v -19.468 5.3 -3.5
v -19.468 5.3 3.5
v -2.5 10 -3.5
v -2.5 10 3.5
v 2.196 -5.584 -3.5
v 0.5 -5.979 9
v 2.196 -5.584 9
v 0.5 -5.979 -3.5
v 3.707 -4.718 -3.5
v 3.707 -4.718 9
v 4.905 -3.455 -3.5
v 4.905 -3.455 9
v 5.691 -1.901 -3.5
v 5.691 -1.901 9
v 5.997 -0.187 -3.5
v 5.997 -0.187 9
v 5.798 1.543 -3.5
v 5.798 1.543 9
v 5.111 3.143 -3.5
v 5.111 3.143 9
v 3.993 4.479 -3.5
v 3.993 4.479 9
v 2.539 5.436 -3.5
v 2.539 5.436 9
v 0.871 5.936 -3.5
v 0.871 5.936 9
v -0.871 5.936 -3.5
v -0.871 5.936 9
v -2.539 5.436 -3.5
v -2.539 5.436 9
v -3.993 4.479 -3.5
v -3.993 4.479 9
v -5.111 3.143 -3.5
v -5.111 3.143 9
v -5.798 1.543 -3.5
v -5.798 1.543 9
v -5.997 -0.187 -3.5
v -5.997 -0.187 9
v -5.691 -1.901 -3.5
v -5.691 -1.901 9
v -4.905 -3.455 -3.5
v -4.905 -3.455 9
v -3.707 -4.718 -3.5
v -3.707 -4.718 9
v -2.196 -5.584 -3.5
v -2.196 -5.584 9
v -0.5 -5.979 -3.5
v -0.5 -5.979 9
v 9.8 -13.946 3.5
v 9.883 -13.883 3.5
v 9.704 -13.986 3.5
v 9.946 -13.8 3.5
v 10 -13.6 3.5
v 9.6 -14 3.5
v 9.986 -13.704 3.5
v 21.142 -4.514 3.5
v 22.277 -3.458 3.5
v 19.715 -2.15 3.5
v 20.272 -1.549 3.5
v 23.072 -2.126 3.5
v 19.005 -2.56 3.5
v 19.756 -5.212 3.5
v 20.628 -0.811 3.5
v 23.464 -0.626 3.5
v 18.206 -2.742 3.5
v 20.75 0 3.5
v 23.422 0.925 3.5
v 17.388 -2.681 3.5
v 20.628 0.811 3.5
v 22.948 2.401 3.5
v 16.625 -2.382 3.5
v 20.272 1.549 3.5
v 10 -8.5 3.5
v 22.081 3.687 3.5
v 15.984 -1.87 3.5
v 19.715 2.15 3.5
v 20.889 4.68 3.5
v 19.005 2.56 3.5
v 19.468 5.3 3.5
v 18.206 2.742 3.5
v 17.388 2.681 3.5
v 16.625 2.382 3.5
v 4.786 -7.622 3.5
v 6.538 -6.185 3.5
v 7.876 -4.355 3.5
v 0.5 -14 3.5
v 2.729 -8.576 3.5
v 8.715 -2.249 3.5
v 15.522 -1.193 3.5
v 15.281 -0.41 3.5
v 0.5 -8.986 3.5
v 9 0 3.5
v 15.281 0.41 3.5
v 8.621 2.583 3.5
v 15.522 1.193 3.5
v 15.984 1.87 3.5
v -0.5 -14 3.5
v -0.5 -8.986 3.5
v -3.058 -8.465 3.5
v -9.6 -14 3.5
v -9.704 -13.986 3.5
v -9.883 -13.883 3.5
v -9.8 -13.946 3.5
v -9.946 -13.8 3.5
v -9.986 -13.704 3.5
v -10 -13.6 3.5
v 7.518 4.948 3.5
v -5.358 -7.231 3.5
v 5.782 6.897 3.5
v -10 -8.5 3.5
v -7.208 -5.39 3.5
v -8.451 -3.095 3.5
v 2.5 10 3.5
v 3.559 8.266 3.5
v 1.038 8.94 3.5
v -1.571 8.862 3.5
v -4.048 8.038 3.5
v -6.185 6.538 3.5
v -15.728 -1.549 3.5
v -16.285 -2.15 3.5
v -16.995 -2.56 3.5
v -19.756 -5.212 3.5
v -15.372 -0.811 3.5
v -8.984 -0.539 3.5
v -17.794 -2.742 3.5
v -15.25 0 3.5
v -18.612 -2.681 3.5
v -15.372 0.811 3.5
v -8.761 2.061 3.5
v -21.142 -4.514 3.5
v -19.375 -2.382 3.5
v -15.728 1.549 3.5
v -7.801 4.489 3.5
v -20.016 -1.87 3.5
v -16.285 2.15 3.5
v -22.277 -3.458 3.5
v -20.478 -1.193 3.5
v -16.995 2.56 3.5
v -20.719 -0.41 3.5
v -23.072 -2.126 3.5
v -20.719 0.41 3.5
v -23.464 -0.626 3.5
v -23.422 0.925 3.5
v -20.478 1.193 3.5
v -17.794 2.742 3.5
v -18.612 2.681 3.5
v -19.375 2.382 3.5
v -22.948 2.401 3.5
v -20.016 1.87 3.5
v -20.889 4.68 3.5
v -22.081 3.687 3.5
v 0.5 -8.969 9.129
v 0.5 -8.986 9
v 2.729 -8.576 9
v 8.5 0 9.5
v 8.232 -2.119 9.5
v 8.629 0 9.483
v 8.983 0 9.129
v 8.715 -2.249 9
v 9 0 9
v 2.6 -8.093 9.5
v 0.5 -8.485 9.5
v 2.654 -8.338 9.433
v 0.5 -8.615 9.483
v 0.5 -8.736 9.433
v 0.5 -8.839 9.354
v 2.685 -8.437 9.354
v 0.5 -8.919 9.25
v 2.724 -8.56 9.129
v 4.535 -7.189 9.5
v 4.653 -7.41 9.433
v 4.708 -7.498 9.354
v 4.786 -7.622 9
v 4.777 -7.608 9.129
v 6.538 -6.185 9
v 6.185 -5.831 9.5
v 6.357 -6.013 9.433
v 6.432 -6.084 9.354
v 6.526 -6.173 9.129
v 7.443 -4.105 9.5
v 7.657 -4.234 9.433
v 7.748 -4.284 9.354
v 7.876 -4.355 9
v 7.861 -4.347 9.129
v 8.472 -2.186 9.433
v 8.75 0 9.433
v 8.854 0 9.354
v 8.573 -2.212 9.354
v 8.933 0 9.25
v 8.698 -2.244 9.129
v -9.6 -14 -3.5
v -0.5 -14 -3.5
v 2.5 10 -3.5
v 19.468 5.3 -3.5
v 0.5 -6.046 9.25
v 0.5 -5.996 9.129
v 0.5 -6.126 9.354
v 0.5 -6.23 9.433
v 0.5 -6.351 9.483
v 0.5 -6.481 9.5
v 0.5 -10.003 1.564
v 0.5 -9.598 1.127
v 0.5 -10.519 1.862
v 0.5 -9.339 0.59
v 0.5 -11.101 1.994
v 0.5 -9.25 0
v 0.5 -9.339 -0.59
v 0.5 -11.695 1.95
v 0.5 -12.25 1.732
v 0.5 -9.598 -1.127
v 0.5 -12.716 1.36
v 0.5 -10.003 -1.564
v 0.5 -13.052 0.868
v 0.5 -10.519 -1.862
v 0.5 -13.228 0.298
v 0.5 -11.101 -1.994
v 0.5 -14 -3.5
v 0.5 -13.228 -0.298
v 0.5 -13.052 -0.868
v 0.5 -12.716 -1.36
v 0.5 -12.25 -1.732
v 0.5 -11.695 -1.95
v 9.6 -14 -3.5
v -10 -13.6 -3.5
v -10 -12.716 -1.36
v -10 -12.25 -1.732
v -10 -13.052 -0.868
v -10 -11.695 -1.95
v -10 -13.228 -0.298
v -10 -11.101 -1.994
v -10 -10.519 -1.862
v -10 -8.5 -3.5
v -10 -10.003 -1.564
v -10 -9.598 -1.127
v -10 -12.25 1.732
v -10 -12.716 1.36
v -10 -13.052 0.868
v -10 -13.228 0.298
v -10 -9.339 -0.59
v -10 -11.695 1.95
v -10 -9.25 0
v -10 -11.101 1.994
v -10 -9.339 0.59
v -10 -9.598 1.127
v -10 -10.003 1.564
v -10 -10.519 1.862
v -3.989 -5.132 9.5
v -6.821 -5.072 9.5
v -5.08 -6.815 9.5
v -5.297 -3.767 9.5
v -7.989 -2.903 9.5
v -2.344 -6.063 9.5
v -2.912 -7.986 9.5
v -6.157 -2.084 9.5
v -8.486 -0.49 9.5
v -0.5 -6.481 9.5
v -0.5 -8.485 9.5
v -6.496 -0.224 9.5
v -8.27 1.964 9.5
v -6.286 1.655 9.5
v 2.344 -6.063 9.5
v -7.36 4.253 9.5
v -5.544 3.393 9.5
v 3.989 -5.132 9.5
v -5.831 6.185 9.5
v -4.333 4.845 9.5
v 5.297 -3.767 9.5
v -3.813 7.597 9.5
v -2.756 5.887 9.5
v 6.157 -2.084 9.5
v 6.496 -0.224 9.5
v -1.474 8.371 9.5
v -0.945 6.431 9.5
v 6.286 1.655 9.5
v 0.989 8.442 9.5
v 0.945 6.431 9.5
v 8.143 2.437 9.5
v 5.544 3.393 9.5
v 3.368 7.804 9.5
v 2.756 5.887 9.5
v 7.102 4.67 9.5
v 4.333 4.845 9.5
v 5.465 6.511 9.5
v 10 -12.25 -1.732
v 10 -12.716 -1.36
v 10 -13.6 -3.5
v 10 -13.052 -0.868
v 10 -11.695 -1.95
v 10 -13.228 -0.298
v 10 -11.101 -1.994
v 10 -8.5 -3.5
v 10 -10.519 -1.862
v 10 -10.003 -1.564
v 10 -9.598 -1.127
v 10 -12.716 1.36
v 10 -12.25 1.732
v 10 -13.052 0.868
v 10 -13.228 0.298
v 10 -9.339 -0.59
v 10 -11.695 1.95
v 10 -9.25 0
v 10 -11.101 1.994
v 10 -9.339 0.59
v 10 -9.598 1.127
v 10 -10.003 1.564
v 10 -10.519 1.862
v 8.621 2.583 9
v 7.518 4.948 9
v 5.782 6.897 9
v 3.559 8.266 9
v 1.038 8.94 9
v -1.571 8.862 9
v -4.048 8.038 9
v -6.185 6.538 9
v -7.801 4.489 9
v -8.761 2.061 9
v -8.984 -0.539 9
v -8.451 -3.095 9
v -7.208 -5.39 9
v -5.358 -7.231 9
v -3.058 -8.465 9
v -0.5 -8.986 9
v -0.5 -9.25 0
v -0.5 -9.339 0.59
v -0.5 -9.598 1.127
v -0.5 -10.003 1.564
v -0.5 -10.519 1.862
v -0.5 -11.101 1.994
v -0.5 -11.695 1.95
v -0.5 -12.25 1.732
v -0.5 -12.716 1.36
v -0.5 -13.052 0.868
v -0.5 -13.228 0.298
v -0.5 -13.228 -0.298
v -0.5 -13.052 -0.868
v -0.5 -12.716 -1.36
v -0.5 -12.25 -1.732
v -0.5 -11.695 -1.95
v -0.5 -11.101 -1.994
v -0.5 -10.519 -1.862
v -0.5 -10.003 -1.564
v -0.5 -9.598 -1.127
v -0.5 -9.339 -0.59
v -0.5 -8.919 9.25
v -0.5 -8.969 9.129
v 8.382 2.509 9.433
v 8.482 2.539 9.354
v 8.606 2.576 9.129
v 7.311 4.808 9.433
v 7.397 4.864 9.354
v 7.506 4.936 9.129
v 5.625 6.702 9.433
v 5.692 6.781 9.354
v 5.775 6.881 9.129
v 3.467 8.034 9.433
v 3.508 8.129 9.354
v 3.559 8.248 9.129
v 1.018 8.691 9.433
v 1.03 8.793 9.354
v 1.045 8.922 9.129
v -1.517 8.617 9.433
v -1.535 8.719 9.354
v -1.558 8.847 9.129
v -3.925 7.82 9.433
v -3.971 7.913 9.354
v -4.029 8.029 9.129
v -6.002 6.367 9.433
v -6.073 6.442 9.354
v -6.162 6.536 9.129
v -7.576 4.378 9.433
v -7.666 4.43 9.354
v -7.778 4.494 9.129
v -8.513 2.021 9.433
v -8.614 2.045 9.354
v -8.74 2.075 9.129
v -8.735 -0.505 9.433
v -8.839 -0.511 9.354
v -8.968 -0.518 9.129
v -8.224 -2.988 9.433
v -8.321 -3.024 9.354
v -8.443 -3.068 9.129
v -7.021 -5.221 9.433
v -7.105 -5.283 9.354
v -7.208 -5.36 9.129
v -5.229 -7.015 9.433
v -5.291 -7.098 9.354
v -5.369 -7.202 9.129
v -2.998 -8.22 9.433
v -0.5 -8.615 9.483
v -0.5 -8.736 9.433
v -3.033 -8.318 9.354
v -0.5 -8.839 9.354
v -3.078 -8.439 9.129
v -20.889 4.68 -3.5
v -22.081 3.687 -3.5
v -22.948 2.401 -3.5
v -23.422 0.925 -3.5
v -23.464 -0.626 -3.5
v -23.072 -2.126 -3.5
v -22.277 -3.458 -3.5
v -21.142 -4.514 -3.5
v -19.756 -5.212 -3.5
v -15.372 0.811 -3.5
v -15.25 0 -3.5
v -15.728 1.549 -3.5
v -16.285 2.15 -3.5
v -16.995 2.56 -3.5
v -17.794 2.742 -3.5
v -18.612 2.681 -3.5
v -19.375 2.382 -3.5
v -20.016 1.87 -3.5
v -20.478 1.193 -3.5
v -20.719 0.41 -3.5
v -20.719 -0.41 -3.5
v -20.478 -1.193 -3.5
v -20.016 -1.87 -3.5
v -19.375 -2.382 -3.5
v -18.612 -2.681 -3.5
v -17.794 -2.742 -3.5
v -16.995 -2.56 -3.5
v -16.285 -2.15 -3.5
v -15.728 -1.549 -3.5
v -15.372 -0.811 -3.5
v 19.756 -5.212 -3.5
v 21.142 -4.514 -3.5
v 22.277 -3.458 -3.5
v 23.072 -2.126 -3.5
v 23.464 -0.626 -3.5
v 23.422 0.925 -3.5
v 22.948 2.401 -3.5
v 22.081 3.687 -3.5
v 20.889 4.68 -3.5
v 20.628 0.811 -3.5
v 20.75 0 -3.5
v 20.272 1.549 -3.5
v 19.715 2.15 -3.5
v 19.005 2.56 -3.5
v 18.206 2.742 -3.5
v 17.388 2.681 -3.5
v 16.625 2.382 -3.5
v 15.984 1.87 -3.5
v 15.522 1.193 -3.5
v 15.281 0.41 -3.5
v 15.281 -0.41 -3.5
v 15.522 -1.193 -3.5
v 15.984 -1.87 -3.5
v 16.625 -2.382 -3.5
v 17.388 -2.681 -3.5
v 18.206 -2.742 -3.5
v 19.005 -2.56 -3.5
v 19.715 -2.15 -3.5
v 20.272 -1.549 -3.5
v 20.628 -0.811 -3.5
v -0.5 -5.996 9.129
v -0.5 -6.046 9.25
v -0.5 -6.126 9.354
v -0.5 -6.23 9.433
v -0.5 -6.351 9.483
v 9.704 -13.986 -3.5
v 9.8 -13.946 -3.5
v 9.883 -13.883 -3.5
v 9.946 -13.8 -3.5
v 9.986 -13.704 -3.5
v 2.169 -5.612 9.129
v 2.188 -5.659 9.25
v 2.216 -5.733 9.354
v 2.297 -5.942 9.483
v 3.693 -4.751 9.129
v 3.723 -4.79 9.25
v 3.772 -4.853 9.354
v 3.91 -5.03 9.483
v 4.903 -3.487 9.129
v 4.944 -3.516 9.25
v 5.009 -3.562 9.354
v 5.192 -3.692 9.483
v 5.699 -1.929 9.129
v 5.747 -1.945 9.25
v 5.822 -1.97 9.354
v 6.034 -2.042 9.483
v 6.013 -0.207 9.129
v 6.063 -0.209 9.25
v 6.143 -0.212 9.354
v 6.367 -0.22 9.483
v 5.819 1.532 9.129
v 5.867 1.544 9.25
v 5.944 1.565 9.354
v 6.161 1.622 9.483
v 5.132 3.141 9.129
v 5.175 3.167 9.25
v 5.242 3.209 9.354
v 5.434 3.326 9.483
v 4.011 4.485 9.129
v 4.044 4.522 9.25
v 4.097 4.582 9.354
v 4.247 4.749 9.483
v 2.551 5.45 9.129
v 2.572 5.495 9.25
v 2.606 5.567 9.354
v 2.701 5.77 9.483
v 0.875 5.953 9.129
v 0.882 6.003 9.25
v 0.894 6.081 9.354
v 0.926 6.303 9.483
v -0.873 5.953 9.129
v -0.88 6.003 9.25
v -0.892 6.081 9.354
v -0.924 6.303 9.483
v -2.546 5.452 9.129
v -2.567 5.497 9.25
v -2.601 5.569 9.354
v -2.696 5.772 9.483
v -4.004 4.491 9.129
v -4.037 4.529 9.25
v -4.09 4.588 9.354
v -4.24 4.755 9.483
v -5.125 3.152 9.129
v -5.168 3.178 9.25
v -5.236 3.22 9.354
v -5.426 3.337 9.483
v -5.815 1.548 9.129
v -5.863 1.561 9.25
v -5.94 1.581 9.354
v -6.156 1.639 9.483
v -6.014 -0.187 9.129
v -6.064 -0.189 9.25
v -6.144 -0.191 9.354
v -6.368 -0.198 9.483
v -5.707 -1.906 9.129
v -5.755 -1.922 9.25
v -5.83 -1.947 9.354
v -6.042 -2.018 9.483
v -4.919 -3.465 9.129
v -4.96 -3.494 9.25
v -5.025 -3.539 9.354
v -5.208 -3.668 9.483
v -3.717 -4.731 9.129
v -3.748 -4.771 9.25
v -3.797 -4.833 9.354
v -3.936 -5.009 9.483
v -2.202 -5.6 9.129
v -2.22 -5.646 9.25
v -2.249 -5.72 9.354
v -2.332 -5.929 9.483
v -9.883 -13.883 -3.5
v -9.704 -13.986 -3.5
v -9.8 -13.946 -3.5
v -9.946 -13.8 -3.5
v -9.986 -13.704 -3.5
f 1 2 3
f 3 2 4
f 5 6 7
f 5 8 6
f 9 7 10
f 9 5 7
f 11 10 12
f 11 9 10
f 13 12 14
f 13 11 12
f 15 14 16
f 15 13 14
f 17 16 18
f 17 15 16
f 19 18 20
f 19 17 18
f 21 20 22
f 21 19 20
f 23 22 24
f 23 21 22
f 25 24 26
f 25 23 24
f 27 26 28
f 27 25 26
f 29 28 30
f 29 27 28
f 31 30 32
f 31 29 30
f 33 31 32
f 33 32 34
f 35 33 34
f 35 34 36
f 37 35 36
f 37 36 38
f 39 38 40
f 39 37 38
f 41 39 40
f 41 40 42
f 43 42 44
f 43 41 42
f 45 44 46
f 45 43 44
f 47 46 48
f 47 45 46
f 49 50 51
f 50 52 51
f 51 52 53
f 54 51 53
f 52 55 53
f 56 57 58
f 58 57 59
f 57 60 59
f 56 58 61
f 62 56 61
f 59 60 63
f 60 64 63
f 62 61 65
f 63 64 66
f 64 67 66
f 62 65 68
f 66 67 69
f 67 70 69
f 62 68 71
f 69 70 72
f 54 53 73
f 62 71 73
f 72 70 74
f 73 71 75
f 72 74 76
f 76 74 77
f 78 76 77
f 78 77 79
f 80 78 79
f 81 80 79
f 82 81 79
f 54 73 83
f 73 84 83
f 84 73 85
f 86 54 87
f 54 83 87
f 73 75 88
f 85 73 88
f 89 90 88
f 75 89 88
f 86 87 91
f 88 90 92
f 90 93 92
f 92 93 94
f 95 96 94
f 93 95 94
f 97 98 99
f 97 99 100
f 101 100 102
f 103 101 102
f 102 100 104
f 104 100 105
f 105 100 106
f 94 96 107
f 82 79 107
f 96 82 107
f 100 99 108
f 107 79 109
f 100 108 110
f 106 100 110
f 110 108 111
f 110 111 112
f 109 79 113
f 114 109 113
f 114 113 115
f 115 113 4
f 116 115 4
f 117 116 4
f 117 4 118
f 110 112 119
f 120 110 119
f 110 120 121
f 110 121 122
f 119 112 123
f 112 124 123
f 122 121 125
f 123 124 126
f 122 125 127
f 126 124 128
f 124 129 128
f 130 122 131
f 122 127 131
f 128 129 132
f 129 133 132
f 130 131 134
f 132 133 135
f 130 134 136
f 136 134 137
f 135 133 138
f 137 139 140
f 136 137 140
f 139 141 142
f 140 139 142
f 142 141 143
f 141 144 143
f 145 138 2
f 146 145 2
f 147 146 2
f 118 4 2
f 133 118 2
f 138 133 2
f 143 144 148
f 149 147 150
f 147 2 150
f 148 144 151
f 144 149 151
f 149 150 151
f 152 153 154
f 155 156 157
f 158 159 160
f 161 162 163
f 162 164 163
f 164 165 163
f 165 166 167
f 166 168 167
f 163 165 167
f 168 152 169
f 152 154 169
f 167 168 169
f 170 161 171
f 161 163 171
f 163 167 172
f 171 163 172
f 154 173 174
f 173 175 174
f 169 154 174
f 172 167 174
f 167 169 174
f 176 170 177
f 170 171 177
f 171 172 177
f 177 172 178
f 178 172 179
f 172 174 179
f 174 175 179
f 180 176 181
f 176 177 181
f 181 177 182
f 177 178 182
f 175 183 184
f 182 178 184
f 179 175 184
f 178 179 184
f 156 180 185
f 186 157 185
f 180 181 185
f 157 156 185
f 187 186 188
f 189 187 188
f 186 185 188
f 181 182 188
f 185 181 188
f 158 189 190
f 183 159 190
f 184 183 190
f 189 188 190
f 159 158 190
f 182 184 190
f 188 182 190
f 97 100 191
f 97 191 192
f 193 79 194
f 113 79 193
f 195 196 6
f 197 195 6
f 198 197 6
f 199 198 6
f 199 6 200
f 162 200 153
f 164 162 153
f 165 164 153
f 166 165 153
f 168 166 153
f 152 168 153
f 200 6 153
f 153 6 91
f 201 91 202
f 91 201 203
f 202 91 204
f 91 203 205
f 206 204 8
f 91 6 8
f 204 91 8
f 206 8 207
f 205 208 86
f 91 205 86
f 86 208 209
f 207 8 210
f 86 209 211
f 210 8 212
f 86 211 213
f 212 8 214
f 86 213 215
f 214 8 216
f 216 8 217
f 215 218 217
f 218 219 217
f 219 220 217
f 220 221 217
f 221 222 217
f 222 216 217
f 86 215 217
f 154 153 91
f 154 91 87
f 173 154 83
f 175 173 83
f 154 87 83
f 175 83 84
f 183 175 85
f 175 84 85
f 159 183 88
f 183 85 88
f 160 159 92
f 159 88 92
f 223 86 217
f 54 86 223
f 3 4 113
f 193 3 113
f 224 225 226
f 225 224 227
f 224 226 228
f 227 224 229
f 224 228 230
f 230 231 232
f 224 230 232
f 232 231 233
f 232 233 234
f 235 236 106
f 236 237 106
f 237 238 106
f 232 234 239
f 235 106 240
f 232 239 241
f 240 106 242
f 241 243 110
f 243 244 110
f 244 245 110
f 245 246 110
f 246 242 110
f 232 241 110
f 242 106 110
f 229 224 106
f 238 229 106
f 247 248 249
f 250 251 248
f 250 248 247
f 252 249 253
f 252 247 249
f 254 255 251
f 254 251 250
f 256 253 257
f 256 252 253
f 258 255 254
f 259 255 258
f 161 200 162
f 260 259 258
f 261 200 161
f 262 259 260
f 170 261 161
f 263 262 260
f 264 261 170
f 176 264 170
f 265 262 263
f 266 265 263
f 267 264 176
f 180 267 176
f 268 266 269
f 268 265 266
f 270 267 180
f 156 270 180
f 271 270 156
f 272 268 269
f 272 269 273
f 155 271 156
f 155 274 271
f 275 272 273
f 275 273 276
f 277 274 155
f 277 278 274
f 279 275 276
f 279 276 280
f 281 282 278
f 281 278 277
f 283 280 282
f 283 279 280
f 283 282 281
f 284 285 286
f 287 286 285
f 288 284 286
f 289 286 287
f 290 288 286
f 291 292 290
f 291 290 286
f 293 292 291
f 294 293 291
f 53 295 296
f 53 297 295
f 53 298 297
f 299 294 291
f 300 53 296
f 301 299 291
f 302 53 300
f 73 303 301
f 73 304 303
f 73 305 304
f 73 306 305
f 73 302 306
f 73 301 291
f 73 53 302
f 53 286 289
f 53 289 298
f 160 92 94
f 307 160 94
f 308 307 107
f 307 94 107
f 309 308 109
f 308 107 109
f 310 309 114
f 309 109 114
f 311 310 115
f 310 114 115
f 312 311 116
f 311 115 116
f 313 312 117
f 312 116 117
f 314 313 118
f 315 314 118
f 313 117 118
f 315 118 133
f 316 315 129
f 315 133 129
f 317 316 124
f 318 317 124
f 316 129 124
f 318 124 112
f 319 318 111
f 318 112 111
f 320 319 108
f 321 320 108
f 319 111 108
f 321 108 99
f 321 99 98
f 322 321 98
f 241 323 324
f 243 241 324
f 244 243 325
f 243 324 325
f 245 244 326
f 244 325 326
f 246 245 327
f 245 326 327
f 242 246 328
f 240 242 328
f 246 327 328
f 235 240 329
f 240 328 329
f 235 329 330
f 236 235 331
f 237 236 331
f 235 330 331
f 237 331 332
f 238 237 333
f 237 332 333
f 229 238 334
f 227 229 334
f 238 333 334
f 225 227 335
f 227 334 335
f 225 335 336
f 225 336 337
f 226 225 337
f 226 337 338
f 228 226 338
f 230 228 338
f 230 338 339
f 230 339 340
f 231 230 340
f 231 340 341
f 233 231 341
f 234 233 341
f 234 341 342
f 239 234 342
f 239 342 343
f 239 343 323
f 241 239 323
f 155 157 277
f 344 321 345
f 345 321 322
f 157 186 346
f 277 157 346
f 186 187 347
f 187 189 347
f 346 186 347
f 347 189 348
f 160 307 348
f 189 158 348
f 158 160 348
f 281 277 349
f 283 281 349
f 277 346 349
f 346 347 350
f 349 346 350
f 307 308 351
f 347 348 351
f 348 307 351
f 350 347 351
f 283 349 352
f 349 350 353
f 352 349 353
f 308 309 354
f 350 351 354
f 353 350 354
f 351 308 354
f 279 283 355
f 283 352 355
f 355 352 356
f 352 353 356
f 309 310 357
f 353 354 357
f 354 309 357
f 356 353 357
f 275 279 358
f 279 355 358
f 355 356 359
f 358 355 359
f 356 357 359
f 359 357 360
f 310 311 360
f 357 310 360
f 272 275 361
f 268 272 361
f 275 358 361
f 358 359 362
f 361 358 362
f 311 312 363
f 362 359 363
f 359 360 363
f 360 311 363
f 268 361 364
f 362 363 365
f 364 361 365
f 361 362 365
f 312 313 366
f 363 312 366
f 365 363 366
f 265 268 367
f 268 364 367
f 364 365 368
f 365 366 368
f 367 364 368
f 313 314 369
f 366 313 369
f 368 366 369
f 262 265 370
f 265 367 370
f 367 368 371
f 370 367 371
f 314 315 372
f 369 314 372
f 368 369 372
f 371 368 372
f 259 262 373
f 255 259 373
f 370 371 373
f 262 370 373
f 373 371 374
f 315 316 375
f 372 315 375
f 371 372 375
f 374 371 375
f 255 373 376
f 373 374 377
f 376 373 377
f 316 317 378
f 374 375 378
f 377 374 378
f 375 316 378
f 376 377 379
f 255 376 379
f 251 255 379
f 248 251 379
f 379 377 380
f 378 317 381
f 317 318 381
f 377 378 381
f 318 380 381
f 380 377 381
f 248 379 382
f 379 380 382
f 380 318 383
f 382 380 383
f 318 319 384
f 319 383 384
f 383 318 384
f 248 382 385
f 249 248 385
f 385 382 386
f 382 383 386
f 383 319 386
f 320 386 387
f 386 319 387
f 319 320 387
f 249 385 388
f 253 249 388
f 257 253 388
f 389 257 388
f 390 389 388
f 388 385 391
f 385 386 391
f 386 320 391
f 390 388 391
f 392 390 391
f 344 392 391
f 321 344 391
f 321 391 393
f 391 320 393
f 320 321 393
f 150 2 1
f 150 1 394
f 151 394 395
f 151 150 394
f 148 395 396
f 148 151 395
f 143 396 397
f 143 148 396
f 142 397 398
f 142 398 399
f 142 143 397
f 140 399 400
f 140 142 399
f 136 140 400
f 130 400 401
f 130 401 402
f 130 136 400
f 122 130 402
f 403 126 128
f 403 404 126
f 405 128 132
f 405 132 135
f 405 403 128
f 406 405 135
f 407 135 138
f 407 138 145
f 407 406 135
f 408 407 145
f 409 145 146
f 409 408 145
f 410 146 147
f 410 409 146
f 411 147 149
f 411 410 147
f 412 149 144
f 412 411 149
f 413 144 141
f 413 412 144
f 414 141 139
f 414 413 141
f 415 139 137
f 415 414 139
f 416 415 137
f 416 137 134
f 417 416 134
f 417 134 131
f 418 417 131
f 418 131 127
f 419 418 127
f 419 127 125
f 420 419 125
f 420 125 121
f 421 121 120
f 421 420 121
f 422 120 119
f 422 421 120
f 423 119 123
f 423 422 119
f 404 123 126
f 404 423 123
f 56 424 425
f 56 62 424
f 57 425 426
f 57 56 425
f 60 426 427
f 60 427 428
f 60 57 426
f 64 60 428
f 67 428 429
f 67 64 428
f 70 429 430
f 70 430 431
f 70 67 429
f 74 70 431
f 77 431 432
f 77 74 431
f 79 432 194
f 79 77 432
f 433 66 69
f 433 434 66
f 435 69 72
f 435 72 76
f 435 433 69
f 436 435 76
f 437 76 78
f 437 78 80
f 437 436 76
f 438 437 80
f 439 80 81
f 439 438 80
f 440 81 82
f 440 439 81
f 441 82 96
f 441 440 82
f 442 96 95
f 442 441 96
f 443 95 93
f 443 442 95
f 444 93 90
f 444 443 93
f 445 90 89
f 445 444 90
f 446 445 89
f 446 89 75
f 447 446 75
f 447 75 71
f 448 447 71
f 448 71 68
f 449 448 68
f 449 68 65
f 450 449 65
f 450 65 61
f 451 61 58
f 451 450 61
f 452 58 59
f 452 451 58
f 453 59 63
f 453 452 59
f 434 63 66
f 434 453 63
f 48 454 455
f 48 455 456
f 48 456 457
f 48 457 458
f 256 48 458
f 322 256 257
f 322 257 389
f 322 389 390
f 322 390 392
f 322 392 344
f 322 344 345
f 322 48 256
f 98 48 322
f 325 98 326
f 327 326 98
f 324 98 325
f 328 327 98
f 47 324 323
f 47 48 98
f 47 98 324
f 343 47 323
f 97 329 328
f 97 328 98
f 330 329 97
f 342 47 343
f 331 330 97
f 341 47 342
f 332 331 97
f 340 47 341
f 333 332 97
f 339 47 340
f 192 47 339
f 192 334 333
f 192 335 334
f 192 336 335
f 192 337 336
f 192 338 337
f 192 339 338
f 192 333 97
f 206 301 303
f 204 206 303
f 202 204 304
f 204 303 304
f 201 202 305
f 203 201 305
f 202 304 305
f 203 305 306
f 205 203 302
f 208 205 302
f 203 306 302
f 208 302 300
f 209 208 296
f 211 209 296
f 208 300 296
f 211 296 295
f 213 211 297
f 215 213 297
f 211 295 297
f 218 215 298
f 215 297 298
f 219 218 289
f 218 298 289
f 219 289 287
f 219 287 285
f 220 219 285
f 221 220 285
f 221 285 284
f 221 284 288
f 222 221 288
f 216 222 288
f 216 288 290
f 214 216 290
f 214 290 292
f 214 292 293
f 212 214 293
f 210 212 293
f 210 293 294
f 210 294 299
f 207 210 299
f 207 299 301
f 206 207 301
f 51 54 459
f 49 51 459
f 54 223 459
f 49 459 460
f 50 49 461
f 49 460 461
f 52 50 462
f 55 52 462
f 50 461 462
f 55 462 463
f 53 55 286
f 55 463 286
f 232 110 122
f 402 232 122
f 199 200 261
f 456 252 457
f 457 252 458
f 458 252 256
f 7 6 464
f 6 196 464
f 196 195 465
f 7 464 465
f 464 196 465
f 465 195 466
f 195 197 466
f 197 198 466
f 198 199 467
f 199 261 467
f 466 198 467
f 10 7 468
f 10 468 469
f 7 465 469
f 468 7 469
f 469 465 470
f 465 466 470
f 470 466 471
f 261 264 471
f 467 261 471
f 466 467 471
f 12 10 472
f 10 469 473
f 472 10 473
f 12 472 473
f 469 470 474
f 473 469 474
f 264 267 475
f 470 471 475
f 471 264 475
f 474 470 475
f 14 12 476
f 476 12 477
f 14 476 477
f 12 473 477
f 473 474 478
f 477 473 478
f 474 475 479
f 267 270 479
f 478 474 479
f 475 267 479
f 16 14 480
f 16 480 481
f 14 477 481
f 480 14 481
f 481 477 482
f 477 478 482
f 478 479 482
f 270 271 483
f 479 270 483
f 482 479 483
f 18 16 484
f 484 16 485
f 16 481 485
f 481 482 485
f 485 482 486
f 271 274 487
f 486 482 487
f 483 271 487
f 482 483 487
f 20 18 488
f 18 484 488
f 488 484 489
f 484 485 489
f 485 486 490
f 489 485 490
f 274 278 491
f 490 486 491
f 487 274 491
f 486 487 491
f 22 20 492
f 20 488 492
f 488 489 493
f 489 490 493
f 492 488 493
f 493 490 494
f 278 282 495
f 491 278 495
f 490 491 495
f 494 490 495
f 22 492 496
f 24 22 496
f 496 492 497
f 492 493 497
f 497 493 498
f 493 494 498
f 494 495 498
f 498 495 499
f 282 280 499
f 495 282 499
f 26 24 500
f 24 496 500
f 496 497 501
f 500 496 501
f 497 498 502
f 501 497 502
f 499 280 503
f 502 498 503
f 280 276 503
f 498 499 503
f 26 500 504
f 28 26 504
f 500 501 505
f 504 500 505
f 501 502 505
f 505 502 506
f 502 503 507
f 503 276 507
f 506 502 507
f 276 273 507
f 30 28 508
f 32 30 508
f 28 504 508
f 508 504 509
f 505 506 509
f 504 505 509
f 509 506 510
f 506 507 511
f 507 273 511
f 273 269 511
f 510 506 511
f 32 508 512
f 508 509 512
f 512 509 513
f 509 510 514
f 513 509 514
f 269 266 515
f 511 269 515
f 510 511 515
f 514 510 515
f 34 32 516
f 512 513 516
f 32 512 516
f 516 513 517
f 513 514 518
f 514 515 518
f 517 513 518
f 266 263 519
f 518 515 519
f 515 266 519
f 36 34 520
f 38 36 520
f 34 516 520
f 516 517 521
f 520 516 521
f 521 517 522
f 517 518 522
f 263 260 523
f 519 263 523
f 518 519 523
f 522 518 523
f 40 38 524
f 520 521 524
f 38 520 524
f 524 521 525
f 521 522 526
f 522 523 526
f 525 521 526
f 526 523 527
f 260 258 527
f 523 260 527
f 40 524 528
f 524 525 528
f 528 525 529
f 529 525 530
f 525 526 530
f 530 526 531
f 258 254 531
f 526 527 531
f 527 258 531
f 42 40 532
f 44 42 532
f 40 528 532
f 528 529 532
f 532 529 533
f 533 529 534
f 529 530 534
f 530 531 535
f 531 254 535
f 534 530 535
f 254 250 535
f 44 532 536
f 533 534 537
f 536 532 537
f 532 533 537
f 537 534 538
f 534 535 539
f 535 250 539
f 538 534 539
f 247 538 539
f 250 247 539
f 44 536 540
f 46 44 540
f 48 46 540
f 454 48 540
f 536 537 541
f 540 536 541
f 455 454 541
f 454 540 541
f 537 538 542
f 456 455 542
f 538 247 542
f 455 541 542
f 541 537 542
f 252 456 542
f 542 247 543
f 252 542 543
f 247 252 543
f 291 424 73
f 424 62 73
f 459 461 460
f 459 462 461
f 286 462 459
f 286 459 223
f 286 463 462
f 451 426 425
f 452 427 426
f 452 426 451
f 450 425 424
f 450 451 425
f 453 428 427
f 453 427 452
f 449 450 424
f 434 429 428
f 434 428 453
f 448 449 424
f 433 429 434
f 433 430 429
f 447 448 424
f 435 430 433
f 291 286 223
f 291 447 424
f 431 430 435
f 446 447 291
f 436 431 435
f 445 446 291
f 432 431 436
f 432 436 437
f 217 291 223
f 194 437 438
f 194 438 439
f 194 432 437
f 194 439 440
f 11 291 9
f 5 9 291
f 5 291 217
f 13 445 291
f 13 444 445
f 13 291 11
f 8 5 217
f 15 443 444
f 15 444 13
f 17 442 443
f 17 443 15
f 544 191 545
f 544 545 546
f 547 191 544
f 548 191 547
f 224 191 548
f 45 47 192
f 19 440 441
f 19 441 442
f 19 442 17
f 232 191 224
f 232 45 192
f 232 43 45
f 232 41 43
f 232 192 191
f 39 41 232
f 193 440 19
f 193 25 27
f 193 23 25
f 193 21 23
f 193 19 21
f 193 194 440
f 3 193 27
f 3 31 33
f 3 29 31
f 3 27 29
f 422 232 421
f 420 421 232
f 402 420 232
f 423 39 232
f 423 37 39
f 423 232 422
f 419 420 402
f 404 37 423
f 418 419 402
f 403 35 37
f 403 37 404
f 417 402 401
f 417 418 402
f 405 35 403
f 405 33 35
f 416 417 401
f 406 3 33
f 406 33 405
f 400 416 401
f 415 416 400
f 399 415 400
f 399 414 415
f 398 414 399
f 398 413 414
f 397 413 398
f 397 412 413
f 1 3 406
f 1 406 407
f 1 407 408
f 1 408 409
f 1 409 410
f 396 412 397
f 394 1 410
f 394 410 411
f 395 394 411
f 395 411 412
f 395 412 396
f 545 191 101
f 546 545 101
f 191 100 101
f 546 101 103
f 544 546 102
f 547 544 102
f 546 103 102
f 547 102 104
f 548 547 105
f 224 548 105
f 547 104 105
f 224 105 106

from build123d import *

# Parameters (mm, degrees)
SKETCH_R        = 6
SKETCH_R_2      = 2.75
PAD_DEPTH       = 3.5
SKETCH003_R     = 9
SKETCH003_R_2   = 6
PAD001_DEPTH    = 6
FILLET_R        = 0.4
SKETCH004_R     = 2
POCKET_DEPTH    = 33.501
FILLET001_R     = 0.5
SKETCH005_W     = 1
SKETCH005_H     = 10
POCKET001_DEPTH = 13.001


with BuildPart() as part:
    # Sketch → Pad (new body, symmetric)
    with BuildSketch(Plane.XY):
        with BuildLine():
            Line((-2.5, 10), (2.5, 10))
            Line((19.468038, 5.300459), (2.5, 10))
            ThreePointArc((19.756482, -5.211983), (23.497931, 0.150854), (19.468038, 5.300459))
            Line((19.756482, -5.211983), (10, -8.5))
            Line((10, -14), (10, -8.5))
            Line((-10, -14), (10, -14))
            Line((-10, -14), (-10, -8.5))
            Line((-10, -8.5), (-19.756482, -5.211983))
            ThreePointArc((-19.468038, 5.300459), (-23.497931, 0.150854), (-19.756482, -5.211983))
            Line((-19.468038, 5.300459), (-2.5, 10))
        make_face()
        Circle(SKETCH_R, mode=Mode.SUBTRACT)
        with Locations((18, 0)):
            Circle(SKETCH_R_2, mode=Mode.SUBTRACT)
        with Locations((-18, 0)):
            Circle(SKETCH_R_2, mode=Mode.SUBTRACT)
    extrude(amount=PAD_DEPTH, both=True)

    # Sketch003 → Pad001 (join)
    with BuildSketch(Plane.XY.offset(3.5)):
        Circle(SKETCH003_R)
        Circle(SKETCH003_R_2, mode=Mode.SUBTRACT)
    extrude(amount=PAD001_DEPTH)

    # Fillet
    fillet_edges = [part.edges().sort_by_distance(p)[0] for p in [
        (10, -14, 0),
        (-10, -14, 0),
    ]]
    fillet(fillet_edges, radius=FILLET_R)

    # Sketch004 (on Face10 of Pad001) → Pocket (cut, through all)
    with BuildSketch(Plane.YZ.offset(10)):
        with Locations((-11.25, 0)):
            Circle(SKETCH004_R)
    extrude(amount=-POCKET_DEPTH, mode=Mode.SUBTRACT)

    # Fillet001
    fillet001_edges = [part.edges().sort_by_distance(p)[0] for p in [
        (-9, 0, 9.5),
        (-6, 0, 9.5),
    ]]
    fillet(fillet001_edges, radius=FILLET001_R)

    # Sketch005 (on Face3 of Fillet001) → Pocket001 (cut, through all)
    with BuildSketch(Plane(origin=(0, 0, -3.5), x_dir=(1, 0, 0), z_dir=(0, 0, -1))):
        with Locations((0, 10)):
            Rectangle(SKETCH005_W, SKETCH005_H)
    extrude(amount=-POCKET001_DEPTH, mode=Mode.SUBTRACT)


solid = part.part
